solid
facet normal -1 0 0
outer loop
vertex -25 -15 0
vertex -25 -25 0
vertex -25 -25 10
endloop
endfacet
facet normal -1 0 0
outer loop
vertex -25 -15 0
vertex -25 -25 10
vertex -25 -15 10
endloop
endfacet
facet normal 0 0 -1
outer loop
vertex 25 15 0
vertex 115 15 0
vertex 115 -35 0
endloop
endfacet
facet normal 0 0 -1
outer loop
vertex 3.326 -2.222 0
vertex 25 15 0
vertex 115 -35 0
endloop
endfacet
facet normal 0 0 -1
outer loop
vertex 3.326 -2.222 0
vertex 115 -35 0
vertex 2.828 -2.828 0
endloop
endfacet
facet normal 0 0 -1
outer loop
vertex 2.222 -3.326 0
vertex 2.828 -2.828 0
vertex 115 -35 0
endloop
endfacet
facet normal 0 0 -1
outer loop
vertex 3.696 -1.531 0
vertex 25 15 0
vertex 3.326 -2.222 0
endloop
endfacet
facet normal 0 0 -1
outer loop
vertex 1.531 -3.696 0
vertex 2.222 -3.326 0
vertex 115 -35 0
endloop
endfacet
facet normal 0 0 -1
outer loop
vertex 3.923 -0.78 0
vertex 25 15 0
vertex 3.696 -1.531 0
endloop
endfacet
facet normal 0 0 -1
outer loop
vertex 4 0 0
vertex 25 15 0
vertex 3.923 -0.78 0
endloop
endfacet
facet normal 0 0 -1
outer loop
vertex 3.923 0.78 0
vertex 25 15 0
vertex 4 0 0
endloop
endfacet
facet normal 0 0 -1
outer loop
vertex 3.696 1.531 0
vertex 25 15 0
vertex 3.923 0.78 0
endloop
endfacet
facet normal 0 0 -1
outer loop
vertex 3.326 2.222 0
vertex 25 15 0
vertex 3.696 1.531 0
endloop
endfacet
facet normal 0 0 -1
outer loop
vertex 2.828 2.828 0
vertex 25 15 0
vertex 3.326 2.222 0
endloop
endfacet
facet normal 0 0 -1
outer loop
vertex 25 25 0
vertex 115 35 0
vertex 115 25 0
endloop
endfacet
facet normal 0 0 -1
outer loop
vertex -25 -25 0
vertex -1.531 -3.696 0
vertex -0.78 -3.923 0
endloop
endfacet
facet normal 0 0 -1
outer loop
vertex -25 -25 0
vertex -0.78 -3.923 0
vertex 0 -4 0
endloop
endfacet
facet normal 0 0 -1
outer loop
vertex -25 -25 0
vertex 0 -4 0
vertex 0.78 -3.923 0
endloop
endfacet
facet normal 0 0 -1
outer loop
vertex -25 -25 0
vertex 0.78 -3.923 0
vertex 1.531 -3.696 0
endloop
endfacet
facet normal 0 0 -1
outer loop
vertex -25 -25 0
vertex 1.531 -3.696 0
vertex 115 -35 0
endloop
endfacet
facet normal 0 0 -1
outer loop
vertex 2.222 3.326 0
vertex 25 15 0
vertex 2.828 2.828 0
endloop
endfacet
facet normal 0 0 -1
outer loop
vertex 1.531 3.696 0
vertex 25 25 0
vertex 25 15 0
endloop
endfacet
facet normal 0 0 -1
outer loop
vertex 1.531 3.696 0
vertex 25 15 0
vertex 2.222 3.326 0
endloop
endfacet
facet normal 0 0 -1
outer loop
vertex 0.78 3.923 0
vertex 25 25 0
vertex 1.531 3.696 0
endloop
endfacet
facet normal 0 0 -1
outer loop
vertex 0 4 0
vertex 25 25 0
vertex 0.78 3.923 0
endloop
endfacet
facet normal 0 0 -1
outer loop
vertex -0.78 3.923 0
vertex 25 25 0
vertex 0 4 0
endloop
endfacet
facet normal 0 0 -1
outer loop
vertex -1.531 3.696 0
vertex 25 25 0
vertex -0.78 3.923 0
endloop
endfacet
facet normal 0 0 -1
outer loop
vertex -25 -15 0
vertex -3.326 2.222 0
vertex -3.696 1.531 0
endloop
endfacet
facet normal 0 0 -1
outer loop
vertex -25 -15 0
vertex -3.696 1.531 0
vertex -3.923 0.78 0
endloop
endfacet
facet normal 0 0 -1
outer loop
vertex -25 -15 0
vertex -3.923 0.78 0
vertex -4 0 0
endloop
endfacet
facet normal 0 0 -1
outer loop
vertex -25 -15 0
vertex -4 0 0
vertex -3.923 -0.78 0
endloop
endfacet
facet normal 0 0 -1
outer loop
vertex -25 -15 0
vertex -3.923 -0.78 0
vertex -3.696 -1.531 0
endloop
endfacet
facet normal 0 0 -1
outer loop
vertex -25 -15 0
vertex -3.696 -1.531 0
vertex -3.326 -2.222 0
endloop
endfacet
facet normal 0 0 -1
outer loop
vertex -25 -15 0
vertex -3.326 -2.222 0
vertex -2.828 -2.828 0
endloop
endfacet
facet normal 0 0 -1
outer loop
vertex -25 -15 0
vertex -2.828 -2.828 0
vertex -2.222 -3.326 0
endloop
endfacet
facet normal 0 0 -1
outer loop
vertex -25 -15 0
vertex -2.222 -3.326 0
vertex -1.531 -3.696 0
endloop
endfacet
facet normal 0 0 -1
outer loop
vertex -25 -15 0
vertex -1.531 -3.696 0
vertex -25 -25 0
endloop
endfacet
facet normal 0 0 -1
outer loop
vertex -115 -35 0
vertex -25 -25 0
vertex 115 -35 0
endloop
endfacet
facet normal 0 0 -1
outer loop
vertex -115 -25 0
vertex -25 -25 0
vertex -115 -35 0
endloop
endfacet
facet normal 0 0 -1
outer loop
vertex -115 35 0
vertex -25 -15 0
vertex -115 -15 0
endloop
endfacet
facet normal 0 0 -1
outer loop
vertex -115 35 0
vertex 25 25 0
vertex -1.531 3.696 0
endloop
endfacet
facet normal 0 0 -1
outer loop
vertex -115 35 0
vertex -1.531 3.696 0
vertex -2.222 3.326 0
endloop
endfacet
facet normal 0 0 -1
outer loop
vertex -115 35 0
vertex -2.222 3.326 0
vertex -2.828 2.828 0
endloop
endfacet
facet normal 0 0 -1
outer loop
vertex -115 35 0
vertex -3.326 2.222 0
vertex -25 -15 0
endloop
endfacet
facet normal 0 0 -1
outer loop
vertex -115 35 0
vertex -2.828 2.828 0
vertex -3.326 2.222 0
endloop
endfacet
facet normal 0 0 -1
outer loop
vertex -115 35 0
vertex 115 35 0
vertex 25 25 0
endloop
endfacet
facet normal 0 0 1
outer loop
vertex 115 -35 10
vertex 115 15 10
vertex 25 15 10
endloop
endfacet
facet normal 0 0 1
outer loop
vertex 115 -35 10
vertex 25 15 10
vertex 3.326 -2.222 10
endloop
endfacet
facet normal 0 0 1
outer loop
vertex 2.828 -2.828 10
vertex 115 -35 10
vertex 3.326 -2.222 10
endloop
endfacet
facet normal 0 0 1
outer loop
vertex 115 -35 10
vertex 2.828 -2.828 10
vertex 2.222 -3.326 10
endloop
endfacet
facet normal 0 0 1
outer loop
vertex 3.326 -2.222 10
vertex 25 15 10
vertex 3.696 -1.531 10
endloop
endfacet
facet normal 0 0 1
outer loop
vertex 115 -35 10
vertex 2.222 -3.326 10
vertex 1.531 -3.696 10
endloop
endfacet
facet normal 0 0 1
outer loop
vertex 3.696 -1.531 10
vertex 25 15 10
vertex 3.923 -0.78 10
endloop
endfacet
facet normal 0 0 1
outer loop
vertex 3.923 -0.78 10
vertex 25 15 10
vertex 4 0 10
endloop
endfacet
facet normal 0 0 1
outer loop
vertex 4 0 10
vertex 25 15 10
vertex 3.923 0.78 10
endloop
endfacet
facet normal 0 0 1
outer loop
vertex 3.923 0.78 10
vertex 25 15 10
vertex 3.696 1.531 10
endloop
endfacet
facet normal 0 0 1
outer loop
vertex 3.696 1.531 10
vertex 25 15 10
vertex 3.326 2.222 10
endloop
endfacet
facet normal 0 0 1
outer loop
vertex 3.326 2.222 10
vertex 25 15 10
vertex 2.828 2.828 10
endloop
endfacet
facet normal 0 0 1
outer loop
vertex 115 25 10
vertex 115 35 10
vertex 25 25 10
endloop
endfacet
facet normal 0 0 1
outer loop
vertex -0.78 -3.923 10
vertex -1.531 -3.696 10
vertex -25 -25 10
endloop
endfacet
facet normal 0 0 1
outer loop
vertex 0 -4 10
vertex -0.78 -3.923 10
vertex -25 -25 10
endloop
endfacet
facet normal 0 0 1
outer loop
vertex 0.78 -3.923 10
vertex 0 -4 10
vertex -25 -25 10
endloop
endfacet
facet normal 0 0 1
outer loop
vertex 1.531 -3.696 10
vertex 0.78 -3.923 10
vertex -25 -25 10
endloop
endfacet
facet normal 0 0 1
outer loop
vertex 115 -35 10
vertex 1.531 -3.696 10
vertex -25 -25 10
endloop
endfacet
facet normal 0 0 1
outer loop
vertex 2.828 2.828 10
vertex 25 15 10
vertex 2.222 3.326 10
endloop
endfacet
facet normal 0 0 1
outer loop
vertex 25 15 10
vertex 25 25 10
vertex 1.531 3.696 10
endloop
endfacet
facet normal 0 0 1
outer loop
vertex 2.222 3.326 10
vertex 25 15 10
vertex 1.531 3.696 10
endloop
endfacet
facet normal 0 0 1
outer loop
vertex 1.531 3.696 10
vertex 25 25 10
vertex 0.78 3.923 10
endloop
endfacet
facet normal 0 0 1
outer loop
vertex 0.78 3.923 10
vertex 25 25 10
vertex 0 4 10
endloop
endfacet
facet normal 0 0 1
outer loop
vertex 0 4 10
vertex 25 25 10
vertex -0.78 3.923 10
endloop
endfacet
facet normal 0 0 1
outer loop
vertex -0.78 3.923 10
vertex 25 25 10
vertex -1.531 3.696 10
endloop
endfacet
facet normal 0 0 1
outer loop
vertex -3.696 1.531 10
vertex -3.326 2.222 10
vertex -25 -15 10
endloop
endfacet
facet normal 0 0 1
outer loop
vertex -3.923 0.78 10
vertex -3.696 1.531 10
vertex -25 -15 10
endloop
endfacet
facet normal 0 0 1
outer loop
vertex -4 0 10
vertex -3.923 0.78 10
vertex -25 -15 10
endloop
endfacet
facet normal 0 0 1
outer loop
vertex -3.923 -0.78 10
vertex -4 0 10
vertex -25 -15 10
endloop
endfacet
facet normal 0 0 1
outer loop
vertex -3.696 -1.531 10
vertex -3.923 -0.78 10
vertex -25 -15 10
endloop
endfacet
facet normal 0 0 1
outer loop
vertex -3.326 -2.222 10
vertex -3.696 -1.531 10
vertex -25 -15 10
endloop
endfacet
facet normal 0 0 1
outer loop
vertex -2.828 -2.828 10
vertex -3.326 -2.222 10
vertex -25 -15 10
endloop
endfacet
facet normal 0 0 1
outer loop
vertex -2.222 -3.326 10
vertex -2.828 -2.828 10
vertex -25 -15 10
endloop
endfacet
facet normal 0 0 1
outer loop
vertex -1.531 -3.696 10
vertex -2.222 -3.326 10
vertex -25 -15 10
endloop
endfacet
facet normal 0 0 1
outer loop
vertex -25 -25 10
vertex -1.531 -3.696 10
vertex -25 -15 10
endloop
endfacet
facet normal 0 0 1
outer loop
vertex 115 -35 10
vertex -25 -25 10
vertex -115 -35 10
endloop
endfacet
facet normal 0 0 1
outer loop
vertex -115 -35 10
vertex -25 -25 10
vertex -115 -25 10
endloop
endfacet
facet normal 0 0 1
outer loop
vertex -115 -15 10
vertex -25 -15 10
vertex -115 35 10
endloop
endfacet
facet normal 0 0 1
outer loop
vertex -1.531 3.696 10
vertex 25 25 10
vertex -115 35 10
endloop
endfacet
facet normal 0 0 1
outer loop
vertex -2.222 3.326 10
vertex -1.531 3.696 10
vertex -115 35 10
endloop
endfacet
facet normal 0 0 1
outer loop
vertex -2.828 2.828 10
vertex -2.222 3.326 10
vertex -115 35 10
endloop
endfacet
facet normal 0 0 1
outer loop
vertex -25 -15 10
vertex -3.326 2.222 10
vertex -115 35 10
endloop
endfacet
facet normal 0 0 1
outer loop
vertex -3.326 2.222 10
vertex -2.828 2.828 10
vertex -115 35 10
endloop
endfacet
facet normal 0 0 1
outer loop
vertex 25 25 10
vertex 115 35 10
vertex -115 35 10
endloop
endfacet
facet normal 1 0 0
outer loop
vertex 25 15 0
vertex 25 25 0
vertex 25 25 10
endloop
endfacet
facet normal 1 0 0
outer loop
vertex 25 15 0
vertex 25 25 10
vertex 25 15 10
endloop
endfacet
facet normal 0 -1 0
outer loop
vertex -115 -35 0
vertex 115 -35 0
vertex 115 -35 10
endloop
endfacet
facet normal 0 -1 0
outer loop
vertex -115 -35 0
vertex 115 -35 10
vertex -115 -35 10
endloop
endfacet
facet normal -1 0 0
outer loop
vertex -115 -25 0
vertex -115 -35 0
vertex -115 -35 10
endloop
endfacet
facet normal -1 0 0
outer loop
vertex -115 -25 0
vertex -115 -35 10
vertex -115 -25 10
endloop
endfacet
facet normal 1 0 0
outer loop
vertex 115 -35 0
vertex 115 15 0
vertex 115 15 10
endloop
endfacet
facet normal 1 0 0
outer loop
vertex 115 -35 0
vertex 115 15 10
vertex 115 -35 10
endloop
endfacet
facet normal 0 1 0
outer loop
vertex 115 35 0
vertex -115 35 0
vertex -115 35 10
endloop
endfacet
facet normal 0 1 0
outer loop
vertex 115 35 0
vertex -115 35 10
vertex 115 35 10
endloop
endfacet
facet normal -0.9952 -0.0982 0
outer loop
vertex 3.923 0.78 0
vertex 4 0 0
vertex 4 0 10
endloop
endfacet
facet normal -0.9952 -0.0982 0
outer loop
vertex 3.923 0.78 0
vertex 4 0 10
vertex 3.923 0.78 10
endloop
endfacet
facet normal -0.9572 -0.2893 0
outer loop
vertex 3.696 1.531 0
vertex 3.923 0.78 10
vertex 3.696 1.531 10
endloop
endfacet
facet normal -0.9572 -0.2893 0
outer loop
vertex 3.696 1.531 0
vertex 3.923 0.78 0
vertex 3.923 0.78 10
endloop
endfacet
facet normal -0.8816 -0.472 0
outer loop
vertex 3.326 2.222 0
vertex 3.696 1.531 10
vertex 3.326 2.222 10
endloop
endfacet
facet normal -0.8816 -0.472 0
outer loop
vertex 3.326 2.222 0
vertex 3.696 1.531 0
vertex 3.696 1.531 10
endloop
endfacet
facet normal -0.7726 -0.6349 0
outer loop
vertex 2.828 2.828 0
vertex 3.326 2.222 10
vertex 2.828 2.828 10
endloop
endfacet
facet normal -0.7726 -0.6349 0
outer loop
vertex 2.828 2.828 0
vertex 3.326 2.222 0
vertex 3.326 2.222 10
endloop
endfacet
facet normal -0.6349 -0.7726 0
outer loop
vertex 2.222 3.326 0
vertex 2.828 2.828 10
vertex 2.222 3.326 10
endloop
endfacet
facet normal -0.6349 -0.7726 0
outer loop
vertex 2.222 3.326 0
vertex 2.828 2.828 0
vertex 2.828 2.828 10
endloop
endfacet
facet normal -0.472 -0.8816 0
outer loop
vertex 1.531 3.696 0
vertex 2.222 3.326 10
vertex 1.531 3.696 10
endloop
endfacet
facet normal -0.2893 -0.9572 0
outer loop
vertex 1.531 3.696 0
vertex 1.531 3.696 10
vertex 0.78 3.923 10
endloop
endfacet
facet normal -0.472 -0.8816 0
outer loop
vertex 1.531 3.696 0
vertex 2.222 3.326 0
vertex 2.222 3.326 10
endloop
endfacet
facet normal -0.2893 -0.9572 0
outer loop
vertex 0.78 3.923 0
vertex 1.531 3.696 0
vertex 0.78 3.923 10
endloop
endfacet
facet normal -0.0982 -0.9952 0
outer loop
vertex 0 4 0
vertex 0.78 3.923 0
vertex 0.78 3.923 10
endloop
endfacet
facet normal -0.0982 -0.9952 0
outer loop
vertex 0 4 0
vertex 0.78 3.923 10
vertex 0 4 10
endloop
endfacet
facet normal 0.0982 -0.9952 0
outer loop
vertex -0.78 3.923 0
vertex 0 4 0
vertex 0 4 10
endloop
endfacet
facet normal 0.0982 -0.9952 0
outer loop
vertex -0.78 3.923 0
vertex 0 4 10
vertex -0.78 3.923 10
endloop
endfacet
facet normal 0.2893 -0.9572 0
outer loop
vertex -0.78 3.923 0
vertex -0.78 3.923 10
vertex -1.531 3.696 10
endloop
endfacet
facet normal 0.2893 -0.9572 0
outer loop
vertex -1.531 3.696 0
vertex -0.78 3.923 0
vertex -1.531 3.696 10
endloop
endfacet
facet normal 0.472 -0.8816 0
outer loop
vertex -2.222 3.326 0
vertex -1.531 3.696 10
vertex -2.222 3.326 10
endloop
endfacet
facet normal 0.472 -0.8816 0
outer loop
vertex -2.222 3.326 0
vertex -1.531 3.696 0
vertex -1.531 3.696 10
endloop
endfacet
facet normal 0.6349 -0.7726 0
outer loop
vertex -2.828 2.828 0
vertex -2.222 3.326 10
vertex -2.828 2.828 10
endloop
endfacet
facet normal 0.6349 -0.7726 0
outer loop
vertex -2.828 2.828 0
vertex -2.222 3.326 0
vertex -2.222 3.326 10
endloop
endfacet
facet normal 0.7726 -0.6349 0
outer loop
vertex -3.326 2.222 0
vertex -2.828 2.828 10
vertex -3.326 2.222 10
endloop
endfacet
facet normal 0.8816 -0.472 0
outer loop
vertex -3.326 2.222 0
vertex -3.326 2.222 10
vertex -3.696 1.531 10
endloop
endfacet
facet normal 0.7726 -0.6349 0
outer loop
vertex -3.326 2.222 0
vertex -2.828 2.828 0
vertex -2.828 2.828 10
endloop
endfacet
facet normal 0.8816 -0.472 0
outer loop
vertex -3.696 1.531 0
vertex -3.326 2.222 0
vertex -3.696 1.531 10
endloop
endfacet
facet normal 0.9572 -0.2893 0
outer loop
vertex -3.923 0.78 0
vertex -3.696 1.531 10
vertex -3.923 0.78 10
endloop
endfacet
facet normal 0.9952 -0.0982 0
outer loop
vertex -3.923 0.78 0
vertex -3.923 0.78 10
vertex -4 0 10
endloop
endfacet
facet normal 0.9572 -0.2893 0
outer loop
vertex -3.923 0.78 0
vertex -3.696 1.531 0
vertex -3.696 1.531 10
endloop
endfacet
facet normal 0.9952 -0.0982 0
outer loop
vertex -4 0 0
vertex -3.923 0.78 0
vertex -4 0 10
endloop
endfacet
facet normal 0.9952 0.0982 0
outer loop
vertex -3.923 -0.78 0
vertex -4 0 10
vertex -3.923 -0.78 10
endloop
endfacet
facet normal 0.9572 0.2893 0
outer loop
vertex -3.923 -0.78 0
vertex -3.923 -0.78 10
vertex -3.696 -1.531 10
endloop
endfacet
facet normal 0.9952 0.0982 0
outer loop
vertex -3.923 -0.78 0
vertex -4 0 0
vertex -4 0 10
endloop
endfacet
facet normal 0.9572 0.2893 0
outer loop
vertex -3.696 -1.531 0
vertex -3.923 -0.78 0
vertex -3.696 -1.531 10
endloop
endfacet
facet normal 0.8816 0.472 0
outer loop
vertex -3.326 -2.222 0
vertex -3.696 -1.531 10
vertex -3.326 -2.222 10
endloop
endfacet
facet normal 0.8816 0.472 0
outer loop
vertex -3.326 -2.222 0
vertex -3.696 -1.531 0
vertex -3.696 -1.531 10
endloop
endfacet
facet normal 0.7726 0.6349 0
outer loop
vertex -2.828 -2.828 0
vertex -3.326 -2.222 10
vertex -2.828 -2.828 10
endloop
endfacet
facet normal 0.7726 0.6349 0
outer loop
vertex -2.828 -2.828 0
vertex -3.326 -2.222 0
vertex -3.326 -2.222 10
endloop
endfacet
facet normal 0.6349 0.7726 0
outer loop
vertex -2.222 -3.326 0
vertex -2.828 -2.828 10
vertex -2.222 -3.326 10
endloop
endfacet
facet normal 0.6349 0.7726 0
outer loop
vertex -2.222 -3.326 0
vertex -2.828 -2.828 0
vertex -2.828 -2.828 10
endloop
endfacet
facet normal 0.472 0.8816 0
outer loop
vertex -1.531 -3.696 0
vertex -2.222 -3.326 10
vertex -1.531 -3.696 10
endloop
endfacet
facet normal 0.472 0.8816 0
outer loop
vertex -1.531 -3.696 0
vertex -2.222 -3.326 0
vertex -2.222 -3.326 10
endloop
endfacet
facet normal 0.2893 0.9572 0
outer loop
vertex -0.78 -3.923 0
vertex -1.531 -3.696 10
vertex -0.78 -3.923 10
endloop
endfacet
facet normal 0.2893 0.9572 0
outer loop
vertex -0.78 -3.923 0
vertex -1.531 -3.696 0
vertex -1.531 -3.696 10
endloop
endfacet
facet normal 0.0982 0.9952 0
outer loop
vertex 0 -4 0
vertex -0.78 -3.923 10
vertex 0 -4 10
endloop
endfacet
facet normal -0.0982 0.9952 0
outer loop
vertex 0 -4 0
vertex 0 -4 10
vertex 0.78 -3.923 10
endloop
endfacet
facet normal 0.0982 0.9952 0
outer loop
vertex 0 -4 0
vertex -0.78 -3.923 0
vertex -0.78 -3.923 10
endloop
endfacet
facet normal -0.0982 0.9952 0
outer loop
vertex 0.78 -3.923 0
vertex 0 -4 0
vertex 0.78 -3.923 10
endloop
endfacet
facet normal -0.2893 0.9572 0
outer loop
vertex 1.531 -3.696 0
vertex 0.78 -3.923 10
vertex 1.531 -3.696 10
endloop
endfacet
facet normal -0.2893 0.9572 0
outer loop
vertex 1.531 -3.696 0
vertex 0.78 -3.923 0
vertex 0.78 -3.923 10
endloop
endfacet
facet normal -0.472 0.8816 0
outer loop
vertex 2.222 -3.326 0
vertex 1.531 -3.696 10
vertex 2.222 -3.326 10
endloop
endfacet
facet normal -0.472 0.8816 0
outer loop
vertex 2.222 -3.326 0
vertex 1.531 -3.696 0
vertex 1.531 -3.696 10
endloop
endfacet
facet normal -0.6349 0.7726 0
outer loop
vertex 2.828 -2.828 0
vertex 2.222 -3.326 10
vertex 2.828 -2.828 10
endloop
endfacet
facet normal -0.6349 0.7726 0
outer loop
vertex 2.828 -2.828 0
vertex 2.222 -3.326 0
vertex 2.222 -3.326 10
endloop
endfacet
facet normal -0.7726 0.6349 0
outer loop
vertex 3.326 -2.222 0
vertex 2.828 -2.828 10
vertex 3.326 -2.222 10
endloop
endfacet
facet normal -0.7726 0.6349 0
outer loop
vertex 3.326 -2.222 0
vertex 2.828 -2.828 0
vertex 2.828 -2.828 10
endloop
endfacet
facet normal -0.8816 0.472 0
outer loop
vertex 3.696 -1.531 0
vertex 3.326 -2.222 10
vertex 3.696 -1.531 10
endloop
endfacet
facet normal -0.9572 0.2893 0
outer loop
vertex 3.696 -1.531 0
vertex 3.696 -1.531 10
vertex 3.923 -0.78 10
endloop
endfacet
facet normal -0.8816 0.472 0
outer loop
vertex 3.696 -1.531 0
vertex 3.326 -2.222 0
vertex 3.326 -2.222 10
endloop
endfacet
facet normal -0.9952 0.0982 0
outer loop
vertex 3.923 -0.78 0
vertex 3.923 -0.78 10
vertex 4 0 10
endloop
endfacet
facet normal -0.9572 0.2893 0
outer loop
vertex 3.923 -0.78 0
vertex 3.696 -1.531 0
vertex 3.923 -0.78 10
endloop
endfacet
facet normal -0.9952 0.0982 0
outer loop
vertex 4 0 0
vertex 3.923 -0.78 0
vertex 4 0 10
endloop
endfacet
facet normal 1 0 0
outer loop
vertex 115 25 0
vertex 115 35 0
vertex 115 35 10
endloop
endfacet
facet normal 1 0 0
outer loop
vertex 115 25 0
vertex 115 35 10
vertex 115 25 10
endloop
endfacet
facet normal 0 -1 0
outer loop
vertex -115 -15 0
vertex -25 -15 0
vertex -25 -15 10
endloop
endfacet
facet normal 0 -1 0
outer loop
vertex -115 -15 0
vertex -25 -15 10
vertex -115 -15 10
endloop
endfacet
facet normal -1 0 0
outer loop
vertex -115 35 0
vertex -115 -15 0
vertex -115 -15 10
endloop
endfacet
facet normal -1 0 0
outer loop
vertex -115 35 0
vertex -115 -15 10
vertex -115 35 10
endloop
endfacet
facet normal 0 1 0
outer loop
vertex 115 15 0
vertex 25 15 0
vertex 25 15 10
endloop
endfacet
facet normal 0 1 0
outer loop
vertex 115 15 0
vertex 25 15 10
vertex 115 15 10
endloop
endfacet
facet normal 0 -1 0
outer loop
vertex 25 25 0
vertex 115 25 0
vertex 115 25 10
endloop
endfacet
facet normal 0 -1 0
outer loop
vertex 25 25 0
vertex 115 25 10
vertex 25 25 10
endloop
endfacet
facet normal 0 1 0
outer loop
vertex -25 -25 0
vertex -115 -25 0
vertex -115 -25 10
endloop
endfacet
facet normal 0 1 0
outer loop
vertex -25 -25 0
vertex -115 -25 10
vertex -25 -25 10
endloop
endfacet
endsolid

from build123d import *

# Parameters (mm, degrees)
SKETCH1_R           = 4
BOSS_EXTRUDE2_DEPTH = 10


with BuildPart() as part:
    # Sketch1 → Boss-Extrude2 (new body)
    with BuildSketch(Plane.XY):
        Polygon((-115, 35), (115, 35), (115, 25), (25, 25), (25, 15), (115, 15), (115, -35), (-115, -35), (-115, -25), (-25, -25), (-25, -15), (-115, -15), align=None)
        Circle(SKETCH1_R, mode=Mode.SUBTRACT)
    extrude(amount=BOSS_EXTRUDE2_DEPTH)


solid = part.part
